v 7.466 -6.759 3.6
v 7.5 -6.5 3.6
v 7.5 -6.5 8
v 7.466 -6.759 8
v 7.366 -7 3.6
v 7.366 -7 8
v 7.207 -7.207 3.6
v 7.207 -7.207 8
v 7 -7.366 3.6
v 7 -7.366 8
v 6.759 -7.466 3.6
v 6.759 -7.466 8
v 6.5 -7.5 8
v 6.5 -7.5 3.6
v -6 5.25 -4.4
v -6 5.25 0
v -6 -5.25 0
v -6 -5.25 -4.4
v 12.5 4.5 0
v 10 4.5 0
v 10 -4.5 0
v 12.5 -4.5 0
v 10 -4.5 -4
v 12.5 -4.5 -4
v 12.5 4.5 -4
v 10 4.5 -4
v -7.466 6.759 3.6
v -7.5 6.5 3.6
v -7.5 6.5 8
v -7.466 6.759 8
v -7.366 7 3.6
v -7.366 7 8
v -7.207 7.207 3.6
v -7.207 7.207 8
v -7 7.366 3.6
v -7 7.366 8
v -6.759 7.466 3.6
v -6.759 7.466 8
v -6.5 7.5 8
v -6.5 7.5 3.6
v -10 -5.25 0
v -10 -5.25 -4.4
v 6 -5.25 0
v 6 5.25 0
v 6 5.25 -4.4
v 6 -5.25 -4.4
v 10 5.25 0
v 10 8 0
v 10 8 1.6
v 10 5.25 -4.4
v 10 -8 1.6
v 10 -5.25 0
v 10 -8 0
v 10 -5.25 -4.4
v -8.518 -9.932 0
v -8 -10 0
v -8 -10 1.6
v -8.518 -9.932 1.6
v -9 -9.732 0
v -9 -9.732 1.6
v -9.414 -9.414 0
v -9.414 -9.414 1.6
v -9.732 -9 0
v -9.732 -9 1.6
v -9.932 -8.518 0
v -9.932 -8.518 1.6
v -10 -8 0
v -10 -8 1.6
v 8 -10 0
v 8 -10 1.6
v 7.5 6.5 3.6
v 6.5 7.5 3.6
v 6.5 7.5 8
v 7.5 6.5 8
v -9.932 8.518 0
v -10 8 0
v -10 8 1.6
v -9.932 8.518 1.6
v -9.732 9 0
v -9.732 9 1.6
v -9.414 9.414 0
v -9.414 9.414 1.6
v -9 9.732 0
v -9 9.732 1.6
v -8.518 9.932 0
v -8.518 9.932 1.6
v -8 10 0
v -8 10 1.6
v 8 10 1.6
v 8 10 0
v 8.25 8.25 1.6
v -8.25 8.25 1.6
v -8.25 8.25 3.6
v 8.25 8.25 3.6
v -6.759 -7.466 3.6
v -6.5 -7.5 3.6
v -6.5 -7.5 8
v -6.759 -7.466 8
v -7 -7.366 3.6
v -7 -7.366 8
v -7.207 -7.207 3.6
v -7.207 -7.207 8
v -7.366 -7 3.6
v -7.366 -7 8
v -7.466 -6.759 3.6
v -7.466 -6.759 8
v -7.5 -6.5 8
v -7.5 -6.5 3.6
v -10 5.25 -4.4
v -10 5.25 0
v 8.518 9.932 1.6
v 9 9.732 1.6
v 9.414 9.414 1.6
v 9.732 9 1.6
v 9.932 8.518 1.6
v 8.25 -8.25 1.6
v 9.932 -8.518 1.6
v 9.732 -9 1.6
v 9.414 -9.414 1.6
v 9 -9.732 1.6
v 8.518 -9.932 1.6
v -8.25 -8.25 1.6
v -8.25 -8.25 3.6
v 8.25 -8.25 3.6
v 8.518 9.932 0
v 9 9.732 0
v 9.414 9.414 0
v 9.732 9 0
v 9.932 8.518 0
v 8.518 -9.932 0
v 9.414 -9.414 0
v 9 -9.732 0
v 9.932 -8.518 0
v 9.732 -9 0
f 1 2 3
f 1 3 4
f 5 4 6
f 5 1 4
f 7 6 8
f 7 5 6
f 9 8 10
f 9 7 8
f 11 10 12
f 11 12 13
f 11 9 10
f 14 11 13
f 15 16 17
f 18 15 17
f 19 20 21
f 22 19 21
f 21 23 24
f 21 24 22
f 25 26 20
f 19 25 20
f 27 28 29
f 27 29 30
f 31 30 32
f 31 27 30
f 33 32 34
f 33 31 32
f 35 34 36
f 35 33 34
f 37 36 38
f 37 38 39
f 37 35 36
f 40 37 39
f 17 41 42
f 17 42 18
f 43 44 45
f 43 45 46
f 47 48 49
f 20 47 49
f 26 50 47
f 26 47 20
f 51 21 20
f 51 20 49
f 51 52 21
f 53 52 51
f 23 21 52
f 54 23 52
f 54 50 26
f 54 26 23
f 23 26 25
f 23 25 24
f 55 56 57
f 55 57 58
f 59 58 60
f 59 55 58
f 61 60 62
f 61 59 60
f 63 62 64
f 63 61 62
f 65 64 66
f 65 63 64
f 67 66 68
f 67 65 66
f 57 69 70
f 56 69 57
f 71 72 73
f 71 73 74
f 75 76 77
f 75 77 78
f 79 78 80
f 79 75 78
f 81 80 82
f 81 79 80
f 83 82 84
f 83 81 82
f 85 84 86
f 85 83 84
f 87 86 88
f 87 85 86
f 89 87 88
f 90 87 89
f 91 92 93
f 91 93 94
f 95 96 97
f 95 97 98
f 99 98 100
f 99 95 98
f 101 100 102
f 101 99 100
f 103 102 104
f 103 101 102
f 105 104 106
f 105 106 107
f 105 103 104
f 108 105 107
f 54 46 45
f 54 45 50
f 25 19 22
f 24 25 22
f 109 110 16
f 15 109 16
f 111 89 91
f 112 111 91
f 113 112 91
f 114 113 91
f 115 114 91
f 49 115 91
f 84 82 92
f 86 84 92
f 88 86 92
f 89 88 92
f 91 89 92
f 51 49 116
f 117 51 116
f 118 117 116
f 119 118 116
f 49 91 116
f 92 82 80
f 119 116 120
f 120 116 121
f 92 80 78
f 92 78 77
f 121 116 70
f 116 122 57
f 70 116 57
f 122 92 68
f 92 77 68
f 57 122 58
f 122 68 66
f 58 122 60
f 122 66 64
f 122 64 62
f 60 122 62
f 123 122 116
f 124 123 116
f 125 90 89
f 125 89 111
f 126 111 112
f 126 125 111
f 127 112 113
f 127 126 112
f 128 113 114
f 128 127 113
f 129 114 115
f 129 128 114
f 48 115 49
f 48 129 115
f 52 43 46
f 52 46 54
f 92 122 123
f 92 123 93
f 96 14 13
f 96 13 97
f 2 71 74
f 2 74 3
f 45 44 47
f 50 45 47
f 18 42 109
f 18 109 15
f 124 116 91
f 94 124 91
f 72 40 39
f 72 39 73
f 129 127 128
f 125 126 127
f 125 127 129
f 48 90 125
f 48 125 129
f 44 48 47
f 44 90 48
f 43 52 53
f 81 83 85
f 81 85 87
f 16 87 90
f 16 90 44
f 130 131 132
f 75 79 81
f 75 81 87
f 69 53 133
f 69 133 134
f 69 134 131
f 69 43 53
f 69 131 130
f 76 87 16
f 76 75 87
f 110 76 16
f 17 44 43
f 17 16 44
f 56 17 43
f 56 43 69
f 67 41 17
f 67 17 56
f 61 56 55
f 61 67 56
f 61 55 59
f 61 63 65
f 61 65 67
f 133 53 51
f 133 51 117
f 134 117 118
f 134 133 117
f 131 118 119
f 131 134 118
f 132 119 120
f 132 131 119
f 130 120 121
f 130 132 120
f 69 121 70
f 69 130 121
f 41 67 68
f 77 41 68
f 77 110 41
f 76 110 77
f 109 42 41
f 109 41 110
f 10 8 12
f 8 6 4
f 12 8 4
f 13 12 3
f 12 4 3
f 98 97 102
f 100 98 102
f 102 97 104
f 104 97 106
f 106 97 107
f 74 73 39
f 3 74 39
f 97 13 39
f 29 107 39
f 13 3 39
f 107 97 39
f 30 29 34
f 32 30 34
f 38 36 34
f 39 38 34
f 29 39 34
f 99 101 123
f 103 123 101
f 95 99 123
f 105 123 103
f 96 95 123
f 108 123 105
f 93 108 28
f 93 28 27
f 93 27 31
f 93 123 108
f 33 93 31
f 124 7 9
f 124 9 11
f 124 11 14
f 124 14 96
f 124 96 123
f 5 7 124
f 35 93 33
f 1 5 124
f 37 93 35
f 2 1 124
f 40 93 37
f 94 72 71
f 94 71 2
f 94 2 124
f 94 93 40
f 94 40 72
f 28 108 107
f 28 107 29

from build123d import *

# Parameters (mm, degrees)
BOSS_EXTRUDE1_DEPTH = 1.6
SKETCH2_W           = 16.5
SKETCH2_H           = 16.5
BOSS_EXTRUDE2_DEPTH = 2
BOSS_EXTRUDE3_DEPTH = 4.4
SKETCH5_W           = 4
SKETCH5_H           = 10.5
BOSS_EXTRUDE4_DEPTH = 4.4
SKETCH6_W           = 9
SKETCH6_H           = 4
BOSS_EXTRUDE5_DEPTH = 2.5


with BuildPart() as part:
    # Sketch1 → Boss-Extrude1 (new body)
    with BuildSketch(Plane(origin=(0, 0, 0), x_dir=(0, 1, 0), z_dir=(0, 0, 1))):
        with BuildLine():
            Line((-8, 10), (8, 10))
            ThreePointArc((8, 10), (9.414213562, 9.414213562), (10, 8))
            Line((10, 8), (10, -8))
            ThreePointArc((10, -8), (9.414213562, -9.414213562), (8, -10))
            Line((8, -10), (-8, -10))
            ThreePointArc((-8, -10), (-9.414213562, -9.414213562), (-10, -8))
            Line((-10, -8), (-10, 8))
            ThreePointArc((-10, 8), (-9.414213562, 9.414213562), (-8, 10))
        make_face()
    extrude(amount=BOSS_EXTRUDE1_DEPTH)

    # Sketch2 → Boss-Extrude2 (add)
    with BuildSketch(Plane.XY.offset(1.6)):
        Rectangle(SKETCH2_W, SKETCH2_H)
    extrude(amount=BOSS_EXTRUDE2_DEPTH)

    # Sketch3 → Boss-Extrude3 (add)
    with BuildSketch(Plane.XY.offset(3.6)):
        with BuildLine():
            Line((6.5, 7.5), (7.5, 6.5))
            Line((7.5, 6.5), (7.5, -6.5))
            ThreePointArc((7.5, -6.5), (7.207106781, -7.207106781), (6.5, -7.5))
            Line((6.5, -7.5), (-6.5, -7.5))
            ThreePointArc((-6.5, -7.5), (-7.207106781, -7.207106781), (-7.5, -6.5))
            Line((-7.5, -6.5), (-7.5, 6.5))
            ThreePointArc((-7.5, 6.5), (-7.207106781, 7.207106781), (-6.5, 7.5))
            Line((-6.5, 7.5), (6.5, 7.5))
        make_face()
    extrude(amount=BOSS_EXTRUDE3_DEPTH)

    # Sketch5 → Boss-Extrude4 (add)
    with BuildSketch(Plane(origin=(0, 0, 0), x_dir=(1, 0, 0), z_dir=(0, 0, -1))):
        with Locations((-8, 0)):
            Rectangle(SKETCH5_W, SKETCH5_H)
        with Locations((8, 0)):
            Rectangle(SKETCH5_W, SKETCH5_H)
    extrude(amount=BOSS_EXTRUDE4_DEPTH)

    # Sketch6 → Boss-Extrude5 (add)
    with BuildSketch(Plane(origin=(10, 0, 0), x_dir=(0, -1, 0), z_dir=(-1, 0, 0))):
        with Locations((0, -2)):
            Rectangle(SKETCH6_W, SKETCH6_H)
    extrude(amount=-BOSS_EXTRUDE5_DEPTH)


solid = part.part
